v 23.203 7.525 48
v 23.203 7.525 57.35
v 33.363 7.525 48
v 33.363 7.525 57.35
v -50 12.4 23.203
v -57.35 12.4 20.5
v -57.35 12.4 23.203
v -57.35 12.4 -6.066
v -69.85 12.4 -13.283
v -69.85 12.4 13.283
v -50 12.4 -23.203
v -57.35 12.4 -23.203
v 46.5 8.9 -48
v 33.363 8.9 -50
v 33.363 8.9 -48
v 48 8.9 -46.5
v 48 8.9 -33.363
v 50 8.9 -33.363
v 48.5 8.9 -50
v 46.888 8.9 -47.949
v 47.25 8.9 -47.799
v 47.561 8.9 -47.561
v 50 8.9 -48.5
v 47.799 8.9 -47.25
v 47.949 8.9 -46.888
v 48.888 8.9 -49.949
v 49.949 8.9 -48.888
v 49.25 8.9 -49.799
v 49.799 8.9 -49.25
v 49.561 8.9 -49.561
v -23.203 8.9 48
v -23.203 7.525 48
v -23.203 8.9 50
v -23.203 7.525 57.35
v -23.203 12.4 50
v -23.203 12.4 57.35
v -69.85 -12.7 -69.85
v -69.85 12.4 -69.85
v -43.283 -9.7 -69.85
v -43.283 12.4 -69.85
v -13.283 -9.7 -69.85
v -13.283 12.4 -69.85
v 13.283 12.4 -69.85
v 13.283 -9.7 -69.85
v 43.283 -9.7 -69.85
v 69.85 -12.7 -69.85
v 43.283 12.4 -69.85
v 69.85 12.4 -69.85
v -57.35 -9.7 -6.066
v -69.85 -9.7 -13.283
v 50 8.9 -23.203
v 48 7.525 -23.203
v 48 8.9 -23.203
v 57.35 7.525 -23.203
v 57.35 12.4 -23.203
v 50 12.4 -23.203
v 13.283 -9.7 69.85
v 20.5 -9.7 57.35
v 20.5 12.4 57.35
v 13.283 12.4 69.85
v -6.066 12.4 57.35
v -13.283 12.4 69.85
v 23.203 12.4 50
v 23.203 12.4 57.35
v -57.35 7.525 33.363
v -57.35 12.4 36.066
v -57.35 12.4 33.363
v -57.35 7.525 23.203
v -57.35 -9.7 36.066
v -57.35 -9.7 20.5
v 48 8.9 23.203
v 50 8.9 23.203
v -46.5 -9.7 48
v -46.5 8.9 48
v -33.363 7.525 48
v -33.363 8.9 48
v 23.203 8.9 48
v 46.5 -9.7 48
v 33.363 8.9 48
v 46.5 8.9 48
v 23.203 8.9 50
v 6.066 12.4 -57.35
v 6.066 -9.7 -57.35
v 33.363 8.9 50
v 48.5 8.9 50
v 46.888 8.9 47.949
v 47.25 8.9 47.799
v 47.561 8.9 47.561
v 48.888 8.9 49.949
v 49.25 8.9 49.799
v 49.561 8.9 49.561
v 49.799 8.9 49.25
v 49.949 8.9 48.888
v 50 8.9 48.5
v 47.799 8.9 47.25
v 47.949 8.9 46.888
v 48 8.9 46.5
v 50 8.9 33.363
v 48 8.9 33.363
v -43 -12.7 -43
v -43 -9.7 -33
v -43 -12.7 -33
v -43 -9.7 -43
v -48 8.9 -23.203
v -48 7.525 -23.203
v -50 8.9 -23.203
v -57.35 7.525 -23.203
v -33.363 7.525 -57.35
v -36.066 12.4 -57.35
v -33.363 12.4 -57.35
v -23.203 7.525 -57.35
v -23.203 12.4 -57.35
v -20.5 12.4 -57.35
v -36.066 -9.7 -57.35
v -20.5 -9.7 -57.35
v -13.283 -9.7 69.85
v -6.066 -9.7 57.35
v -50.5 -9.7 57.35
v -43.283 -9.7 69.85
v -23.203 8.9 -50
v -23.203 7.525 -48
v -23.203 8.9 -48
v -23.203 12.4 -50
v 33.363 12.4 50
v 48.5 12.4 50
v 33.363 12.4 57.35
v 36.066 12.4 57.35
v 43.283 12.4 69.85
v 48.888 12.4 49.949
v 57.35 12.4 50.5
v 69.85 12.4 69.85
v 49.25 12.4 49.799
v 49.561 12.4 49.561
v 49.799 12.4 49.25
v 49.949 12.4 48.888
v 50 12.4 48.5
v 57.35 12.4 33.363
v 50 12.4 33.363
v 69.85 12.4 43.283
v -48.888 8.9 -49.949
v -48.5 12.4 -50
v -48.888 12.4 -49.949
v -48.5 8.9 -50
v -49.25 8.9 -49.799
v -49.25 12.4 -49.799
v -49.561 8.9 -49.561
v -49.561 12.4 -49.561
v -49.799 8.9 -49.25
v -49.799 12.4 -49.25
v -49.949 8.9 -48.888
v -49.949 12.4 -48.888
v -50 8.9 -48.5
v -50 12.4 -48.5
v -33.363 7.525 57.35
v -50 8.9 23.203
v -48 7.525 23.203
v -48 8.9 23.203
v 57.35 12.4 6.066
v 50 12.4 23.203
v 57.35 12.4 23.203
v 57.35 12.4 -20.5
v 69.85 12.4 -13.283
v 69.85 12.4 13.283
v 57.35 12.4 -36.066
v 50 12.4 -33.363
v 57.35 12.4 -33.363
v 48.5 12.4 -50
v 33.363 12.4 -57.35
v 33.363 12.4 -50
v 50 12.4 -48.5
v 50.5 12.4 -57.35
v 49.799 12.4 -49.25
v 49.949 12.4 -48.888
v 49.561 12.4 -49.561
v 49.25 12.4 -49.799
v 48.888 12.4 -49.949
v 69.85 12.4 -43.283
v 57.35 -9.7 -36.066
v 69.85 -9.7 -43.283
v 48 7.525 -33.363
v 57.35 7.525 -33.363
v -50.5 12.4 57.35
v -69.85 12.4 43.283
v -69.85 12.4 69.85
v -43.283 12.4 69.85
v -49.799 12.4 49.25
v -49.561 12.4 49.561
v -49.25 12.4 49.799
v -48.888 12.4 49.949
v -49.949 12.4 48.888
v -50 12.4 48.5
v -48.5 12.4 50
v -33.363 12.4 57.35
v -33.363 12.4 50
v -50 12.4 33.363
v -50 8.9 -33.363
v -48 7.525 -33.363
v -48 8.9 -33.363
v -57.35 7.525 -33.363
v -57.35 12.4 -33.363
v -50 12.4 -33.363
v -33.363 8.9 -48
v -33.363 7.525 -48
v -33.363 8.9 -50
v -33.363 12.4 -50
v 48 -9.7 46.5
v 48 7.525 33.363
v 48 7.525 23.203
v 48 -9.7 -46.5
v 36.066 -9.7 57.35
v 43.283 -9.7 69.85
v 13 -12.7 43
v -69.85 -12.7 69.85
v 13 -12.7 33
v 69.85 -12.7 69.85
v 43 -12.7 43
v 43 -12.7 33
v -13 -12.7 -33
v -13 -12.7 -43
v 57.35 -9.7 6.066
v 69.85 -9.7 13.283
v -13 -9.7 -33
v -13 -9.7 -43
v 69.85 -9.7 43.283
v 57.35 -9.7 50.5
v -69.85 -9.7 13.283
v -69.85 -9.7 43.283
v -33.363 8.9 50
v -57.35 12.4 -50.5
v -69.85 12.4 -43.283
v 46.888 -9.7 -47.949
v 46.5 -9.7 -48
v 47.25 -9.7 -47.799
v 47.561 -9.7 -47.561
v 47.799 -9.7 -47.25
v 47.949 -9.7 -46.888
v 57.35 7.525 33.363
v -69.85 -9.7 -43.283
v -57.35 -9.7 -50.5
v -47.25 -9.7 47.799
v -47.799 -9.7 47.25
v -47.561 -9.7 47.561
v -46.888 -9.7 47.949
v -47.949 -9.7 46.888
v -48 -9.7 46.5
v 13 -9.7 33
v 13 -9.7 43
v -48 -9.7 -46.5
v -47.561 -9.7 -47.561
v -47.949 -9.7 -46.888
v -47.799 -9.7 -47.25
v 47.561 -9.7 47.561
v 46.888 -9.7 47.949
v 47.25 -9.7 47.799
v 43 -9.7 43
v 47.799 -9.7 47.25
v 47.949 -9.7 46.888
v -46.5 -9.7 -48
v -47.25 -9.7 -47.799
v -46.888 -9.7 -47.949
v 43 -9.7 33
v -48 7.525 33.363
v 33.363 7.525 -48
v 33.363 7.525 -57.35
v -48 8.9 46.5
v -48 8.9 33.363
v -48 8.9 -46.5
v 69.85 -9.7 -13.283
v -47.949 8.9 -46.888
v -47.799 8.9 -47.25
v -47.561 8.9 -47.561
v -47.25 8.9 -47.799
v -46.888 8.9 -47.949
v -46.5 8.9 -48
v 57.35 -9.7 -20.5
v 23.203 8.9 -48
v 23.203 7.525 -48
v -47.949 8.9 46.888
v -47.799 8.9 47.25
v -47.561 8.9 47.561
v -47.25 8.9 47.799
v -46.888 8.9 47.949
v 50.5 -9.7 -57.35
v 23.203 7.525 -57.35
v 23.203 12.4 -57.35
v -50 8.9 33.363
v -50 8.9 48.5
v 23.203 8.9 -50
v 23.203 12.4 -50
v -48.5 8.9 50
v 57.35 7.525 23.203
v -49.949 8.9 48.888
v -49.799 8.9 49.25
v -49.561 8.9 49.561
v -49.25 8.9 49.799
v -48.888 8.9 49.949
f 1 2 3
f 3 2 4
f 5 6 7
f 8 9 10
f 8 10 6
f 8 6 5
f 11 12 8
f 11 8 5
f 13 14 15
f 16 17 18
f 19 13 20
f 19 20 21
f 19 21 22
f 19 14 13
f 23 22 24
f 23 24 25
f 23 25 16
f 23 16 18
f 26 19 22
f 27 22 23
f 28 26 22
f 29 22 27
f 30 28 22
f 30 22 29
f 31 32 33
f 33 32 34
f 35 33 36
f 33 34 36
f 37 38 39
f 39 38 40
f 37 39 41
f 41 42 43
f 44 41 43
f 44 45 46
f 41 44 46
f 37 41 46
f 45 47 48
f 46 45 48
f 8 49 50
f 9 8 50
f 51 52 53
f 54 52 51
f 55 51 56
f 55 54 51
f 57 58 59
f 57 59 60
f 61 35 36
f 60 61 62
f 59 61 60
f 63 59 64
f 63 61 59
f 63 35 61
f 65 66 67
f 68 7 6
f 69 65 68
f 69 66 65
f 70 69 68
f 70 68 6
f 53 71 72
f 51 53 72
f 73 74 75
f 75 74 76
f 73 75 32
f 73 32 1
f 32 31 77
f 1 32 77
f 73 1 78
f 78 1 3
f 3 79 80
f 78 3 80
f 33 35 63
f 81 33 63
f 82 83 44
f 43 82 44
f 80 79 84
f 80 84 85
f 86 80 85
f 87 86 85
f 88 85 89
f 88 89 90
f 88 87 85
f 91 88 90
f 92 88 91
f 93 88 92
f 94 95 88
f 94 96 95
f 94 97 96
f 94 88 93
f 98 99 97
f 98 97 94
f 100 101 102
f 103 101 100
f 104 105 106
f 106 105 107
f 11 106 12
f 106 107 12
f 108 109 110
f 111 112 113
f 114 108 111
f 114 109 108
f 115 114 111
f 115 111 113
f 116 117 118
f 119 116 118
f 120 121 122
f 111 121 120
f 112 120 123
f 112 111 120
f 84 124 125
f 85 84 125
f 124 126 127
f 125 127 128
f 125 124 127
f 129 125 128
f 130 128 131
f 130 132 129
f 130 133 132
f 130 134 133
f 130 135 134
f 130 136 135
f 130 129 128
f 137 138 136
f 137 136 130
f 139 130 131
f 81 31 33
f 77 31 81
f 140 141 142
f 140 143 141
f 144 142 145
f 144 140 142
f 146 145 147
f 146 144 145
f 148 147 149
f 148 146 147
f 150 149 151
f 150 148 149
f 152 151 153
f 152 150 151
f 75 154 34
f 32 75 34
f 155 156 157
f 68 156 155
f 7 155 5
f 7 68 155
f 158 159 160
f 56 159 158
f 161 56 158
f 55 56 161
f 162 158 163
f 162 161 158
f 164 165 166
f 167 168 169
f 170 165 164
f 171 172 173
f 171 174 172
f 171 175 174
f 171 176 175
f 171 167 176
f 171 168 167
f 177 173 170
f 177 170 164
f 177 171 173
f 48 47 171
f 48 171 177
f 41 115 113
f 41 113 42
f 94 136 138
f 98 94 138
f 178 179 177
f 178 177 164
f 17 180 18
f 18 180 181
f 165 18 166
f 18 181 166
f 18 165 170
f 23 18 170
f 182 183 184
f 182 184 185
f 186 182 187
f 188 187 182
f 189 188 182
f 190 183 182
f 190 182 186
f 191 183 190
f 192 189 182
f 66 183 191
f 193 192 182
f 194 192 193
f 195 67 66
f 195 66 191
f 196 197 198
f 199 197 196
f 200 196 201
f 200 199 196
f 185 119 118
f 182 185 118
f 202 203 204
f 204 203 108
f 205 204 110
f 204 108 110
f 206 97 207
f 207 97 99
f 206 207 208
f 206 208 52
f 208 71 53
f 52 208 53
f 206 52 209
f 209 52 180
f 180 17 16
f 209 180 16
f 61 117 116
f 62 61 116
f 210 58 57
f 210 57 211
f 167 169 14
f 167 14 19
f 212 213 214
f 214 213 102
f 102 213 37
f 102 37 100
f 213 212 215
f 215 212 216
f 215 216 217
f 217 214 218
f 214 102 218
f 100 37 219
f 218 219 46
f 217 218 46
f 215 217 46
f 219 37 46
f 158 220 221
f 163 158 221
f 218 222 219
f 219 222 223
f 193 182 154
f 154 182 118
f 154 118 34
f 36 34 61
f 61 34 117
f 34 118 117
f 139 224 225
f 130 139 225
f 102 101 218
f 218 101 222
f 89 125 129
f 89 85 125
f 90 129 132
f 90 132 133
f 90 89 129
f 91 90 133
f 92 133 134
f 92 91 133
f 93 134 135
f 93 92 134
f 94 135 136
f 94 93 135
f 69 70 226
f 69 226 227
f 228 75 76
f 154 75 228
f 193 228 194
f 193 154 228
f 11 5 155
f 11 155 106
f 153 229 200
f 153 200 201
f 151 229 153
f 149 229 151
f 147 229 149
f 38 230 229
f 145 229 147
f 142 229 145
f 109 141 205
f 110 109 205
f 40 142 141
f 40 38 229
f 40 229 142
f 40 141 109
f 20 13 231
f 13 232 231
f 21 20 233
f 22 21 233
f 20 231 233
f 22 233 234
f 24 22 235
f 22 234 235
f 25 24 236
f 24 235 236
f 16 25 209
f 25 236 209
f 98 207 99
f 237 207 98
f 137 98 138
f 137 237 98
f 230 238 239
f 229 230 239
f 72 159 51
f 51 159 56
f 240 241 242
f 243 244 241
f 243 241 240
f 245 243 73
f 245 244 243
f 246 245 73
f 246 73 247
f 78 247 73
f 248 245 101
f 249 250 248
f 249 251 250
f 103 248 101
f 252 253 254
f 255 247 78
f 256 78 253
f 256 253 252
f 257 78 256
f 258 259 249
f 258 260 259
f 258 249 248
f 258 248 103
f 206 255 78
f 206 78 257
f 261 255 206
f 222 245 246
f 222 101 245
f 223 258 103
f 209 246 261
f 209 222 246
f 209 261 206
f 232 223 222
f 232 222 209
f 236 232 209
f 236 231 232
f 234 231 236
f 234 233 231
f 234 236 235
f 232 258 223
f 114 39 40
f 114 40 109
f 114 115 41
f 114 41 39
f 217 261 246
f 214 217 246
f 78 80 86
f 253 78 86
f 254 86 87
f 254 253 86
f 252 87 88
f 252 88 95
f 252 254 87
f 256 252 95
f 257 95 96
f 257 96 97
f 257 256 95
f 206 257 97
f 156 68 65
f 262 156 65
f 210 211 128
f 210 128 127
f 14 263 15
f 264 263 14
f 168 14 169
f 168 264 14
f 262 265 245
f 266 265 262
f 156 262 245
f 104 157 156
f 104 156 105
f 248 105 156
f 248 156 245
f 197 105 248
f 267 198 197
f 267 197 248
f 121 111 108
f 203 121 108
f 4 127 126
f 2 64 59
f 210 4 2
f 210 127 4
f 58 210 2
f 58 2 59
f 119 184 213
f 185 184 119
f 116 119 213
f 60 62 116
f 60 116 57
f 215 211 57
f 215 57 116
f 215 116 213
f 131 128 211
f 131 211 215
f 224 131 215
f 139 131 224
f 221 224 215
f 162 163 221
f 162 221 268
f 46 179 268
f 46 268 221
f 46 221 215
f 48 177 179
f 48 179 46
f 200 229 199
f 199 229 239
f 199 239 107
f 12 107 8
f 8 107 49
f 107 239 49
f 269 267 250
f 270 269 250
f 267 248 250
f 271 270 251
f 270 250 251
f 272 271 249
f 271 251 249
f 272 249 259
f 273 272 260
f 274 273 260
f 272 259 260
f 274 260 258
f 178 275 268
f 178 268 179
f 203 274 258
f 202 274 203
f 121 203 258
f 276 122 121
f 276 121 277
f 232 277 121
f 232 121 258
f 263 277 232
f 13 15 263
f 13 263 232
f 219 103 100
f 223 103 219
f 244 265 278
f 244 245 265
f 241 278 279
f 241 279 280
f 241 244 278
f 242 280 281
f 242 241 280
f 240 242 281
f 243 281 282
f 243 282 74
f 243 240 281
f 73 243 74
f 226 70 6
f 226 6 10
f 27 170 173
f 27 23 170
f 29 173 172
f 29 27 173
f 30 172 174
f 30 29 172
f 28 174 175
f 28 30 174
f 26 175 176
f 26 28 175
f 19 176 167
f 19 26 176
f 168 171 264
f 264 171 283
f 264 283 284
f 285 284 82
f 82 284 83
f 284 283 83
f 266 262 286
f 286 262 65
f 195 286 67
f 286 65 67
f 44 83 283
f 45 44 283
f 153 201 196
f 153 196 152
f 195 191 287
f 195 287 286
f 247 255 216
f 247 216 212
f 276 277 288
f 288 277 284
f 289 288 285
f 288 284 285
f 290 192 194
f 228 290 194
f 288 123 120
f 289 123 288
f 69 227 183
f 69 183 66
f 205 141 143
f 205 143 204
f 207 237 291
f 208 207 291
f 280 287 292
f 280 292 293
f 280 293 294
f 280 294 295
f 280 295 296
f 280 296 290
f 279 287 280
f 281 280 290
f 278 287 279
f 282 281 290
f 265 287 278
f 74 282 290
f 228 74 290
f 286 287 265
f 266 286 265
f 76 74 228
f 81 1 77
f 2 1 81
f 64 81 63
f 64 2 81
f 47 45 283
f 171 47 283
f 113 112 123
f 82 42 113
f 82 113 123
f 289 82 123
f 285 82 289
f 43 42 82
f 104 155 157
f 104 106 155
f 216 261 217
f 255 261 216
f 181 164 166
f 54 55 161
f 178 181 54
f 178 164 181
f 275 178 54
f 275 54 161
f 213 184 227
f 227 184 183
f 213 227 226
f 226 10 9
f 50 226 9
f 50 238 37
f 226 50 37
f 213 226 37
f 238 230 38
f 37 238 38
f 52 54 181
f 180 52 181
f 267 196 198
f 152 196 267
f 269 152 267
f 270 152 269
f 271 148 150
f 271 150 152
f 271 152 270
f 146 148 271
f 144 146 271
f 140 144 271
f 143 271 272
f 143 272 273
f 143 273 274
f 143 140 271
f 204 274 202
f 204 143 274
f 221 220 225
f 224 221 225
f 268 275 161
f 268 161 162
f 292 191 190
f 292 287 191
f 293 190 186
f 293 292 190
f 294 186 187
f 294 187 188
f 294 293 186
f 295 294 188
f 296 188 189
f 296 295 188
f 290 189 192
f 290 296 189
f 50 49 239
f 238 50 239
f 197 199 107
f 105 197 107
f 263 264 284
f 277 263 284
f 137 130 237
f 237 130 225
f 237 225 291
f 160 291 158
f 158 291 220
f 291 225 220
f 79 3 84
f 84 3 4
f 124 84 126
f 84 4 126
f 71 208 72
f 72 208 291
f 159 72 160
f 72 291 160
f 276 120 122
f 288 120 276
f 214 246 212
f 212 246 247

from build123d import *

# Parameters (mm, degrees)
SKETCH1_W           = 139.7
SKETCH1_H           = 139.7
BOSS_EXTRUDE1_DEPTH = 12.7
SKETCH2_W           = 139.7
SKETCH2_H           = 139.7
CUT_EXTRUDE1_DEPTH  = 0.3
CUT_EXTRUDE2_START  = -22.1
CUT_EXTRUDE2_DEPTH  = 125.021808265
SKETCH18_W          = 10.16
SKETCH18_H          = 4.875
CUT_EXTRUDE6_DEPTH  = 20
CIRPATTERN1_COUNT   = 4
SKETCH19_W          = 100
SKETCH19_H          = 100
CUT_EXTRUDE8_DEPTH  = 3.5
SKETCH20_W          = 96
SKETCH20_H          = 96
CUT_EXTRUDE9_DEPTH  = 18.6
SKETCH21_W          = 30
SKETCH21_H          = 10
CUT_EXTRUDE10_DEPTH = 102.224774635
FILLET2_R           = 1.5
CIRPATTERN2_COUNT   = 2


with BuildPart() as part:
    # Sketch1 → Boss-Extrude1 (new, symmetric)
    with BuildSketch(Plane(origin=(0, 0, 0), x_dir=(1, 0, 0), z_dir=(0, 1, 0))):
        Rectangle(SKETCH1_W, SKETCH1_H)
    extrude(amount=BOSS_EXTRUDE1_DEPTH, both=True)

    # Sketch2 → Cut-Extrude1 (cut)
    with BuildSketch(Plane(origin=(0, 12.7, 0), x_dir=(1, 0, 0), z_dir=(0, 1, 0))):
        Rectangle(SKETCH2_W, SKETCH2_H)
    extrude(amount=-CUT_EXTRUDE1_DEPTH, mode=Mode.SUBTRACT)

    # Sketch4 → Cut-Extrude2 (cut)
    with BuildSketch(Plane(origin=(0, 12.4, 0), x_dir=(1, 0, 0), z_dir=(0, 1, 0)).offset(CUT_EXTRUDE2_START)):
        Polygon((-43.283333333, -69.85), (-50.500211698, -57.35), (-6.066454968, -57.35), (-13.283333333, -69.85), align=None)
        Polygon((43.283333333, -69.85), (36.066454968, -57.35), (20.500211698, -57.35), (13.283333333, -69.85), align=None)
    cut_extrude2 = extrude(amount=CUT_EXTRUDE2_DEPTH, mode=Mode.SUBTRACT)

    # Sketch18 → Cut-Extrude6 (cut)
    with BuildSketch(Plane.XY.offset(57.35)):
        with Locations((28.283333333, 9.9625)):
            Rectangle(SKETCH18_W, SKETCH18_H)
        with Locations((-28.283333333, 9.9625)):
            Rectangle(SKETCH18_W, SKETCH18_H)
    cut_extrude6 = extrude(amount=-CUT_EXTRUDE6_DEPTH, mode=Mode.SUBTRACT)

    # CirPattern1: Cut-Extrude2, Cut-Extrude6 ×4 about axis
    cirpattern1_axis = Axis((0, 0, 0), (0, 1, 0))
    add([cut_extrude2.rotate(cirpattern1_axis, i * 360 / CIRPATTERN1_COUNT) for i in range(1, CIRPATTERN1_COUNT)], mode=Mode.SUBTRACT)
    add([cut_extrude6.rotate(cirpattern1_axis, i * 360 / CIRPATTERN1_COUNT) for i in range(1, CIRPATTERN1_COUNT)], mode=Mode.SUBTRACT)

    # Sketch19 → Cut-Extrude8 (cut)
    with BuildSketch(Plane(origin=(0, 12.4, 0), x_dir=(1, 0, 0), z_dir=(0, 1, 0))):
        Rectangle(SKETCH19_W, SKETCH19_H)
    extrude(amount=-CUT_EXTRUDE8_DEPTH, mode=Mode.SUBTRACT)

    # Sketch20 → Cut-Extrude9 (cut)
    with BuildSketch(Plane(origin=(0, 8.9, 0), x_dir=(1, 0, 0), z_dir=(0, 1, 0))):
        Rectangle(SKETCH20_W, SKETCH20_H)
    extrude(amount=-CUT_EXTRUDE9_DEPTH, mode=Mode.SUBTRACT)

    # Sketch21 → Cut-Extrude10 (cut, through all)
    with BuildSketch(Plane(origin=(0, -9.7, 0), x_dir=(1, 0, 0), z_dir=(0, 1, 0))):
        with Locations((-28, 38)):
            Rectangle(SKETCH21_W, SKETCH21_H)
    cut_extrude10 = extrude(amount=-CUT_EXTRUDE10_DEPTH, mode=Mode.SUBTRACT)

    # Fillet2
    fillet2_edges = [part.edges().sort_by_distance(p)[0] for p in [
        (50, 10.65, 50),
        (-50, 10.65, -50),
        (50, 10.65, -50),
        (-50, 10.65, 50),
        (48, -0.4, -48),
        (48, -0.4, 48),
        (-48, -0.4, 48),
        (-48, -0.4, -48),
    ]]
    fillet(fillet2_edges, radius=FILLET2_R)

    # CirPattern2: Cut-Extrude10 ×2 about axis
    cirpattern2_axis = Axis((0, 0, 0), (0, 1, 0))
    for i in range(1, CIRPATTERN2_COUNT):
        add(cut_extrude10.rotate(cirpattern2_axis, i * 360 / CIRPATTERN2_COUNT), mode=Mode.SUBTRACT)


solid = part.part
